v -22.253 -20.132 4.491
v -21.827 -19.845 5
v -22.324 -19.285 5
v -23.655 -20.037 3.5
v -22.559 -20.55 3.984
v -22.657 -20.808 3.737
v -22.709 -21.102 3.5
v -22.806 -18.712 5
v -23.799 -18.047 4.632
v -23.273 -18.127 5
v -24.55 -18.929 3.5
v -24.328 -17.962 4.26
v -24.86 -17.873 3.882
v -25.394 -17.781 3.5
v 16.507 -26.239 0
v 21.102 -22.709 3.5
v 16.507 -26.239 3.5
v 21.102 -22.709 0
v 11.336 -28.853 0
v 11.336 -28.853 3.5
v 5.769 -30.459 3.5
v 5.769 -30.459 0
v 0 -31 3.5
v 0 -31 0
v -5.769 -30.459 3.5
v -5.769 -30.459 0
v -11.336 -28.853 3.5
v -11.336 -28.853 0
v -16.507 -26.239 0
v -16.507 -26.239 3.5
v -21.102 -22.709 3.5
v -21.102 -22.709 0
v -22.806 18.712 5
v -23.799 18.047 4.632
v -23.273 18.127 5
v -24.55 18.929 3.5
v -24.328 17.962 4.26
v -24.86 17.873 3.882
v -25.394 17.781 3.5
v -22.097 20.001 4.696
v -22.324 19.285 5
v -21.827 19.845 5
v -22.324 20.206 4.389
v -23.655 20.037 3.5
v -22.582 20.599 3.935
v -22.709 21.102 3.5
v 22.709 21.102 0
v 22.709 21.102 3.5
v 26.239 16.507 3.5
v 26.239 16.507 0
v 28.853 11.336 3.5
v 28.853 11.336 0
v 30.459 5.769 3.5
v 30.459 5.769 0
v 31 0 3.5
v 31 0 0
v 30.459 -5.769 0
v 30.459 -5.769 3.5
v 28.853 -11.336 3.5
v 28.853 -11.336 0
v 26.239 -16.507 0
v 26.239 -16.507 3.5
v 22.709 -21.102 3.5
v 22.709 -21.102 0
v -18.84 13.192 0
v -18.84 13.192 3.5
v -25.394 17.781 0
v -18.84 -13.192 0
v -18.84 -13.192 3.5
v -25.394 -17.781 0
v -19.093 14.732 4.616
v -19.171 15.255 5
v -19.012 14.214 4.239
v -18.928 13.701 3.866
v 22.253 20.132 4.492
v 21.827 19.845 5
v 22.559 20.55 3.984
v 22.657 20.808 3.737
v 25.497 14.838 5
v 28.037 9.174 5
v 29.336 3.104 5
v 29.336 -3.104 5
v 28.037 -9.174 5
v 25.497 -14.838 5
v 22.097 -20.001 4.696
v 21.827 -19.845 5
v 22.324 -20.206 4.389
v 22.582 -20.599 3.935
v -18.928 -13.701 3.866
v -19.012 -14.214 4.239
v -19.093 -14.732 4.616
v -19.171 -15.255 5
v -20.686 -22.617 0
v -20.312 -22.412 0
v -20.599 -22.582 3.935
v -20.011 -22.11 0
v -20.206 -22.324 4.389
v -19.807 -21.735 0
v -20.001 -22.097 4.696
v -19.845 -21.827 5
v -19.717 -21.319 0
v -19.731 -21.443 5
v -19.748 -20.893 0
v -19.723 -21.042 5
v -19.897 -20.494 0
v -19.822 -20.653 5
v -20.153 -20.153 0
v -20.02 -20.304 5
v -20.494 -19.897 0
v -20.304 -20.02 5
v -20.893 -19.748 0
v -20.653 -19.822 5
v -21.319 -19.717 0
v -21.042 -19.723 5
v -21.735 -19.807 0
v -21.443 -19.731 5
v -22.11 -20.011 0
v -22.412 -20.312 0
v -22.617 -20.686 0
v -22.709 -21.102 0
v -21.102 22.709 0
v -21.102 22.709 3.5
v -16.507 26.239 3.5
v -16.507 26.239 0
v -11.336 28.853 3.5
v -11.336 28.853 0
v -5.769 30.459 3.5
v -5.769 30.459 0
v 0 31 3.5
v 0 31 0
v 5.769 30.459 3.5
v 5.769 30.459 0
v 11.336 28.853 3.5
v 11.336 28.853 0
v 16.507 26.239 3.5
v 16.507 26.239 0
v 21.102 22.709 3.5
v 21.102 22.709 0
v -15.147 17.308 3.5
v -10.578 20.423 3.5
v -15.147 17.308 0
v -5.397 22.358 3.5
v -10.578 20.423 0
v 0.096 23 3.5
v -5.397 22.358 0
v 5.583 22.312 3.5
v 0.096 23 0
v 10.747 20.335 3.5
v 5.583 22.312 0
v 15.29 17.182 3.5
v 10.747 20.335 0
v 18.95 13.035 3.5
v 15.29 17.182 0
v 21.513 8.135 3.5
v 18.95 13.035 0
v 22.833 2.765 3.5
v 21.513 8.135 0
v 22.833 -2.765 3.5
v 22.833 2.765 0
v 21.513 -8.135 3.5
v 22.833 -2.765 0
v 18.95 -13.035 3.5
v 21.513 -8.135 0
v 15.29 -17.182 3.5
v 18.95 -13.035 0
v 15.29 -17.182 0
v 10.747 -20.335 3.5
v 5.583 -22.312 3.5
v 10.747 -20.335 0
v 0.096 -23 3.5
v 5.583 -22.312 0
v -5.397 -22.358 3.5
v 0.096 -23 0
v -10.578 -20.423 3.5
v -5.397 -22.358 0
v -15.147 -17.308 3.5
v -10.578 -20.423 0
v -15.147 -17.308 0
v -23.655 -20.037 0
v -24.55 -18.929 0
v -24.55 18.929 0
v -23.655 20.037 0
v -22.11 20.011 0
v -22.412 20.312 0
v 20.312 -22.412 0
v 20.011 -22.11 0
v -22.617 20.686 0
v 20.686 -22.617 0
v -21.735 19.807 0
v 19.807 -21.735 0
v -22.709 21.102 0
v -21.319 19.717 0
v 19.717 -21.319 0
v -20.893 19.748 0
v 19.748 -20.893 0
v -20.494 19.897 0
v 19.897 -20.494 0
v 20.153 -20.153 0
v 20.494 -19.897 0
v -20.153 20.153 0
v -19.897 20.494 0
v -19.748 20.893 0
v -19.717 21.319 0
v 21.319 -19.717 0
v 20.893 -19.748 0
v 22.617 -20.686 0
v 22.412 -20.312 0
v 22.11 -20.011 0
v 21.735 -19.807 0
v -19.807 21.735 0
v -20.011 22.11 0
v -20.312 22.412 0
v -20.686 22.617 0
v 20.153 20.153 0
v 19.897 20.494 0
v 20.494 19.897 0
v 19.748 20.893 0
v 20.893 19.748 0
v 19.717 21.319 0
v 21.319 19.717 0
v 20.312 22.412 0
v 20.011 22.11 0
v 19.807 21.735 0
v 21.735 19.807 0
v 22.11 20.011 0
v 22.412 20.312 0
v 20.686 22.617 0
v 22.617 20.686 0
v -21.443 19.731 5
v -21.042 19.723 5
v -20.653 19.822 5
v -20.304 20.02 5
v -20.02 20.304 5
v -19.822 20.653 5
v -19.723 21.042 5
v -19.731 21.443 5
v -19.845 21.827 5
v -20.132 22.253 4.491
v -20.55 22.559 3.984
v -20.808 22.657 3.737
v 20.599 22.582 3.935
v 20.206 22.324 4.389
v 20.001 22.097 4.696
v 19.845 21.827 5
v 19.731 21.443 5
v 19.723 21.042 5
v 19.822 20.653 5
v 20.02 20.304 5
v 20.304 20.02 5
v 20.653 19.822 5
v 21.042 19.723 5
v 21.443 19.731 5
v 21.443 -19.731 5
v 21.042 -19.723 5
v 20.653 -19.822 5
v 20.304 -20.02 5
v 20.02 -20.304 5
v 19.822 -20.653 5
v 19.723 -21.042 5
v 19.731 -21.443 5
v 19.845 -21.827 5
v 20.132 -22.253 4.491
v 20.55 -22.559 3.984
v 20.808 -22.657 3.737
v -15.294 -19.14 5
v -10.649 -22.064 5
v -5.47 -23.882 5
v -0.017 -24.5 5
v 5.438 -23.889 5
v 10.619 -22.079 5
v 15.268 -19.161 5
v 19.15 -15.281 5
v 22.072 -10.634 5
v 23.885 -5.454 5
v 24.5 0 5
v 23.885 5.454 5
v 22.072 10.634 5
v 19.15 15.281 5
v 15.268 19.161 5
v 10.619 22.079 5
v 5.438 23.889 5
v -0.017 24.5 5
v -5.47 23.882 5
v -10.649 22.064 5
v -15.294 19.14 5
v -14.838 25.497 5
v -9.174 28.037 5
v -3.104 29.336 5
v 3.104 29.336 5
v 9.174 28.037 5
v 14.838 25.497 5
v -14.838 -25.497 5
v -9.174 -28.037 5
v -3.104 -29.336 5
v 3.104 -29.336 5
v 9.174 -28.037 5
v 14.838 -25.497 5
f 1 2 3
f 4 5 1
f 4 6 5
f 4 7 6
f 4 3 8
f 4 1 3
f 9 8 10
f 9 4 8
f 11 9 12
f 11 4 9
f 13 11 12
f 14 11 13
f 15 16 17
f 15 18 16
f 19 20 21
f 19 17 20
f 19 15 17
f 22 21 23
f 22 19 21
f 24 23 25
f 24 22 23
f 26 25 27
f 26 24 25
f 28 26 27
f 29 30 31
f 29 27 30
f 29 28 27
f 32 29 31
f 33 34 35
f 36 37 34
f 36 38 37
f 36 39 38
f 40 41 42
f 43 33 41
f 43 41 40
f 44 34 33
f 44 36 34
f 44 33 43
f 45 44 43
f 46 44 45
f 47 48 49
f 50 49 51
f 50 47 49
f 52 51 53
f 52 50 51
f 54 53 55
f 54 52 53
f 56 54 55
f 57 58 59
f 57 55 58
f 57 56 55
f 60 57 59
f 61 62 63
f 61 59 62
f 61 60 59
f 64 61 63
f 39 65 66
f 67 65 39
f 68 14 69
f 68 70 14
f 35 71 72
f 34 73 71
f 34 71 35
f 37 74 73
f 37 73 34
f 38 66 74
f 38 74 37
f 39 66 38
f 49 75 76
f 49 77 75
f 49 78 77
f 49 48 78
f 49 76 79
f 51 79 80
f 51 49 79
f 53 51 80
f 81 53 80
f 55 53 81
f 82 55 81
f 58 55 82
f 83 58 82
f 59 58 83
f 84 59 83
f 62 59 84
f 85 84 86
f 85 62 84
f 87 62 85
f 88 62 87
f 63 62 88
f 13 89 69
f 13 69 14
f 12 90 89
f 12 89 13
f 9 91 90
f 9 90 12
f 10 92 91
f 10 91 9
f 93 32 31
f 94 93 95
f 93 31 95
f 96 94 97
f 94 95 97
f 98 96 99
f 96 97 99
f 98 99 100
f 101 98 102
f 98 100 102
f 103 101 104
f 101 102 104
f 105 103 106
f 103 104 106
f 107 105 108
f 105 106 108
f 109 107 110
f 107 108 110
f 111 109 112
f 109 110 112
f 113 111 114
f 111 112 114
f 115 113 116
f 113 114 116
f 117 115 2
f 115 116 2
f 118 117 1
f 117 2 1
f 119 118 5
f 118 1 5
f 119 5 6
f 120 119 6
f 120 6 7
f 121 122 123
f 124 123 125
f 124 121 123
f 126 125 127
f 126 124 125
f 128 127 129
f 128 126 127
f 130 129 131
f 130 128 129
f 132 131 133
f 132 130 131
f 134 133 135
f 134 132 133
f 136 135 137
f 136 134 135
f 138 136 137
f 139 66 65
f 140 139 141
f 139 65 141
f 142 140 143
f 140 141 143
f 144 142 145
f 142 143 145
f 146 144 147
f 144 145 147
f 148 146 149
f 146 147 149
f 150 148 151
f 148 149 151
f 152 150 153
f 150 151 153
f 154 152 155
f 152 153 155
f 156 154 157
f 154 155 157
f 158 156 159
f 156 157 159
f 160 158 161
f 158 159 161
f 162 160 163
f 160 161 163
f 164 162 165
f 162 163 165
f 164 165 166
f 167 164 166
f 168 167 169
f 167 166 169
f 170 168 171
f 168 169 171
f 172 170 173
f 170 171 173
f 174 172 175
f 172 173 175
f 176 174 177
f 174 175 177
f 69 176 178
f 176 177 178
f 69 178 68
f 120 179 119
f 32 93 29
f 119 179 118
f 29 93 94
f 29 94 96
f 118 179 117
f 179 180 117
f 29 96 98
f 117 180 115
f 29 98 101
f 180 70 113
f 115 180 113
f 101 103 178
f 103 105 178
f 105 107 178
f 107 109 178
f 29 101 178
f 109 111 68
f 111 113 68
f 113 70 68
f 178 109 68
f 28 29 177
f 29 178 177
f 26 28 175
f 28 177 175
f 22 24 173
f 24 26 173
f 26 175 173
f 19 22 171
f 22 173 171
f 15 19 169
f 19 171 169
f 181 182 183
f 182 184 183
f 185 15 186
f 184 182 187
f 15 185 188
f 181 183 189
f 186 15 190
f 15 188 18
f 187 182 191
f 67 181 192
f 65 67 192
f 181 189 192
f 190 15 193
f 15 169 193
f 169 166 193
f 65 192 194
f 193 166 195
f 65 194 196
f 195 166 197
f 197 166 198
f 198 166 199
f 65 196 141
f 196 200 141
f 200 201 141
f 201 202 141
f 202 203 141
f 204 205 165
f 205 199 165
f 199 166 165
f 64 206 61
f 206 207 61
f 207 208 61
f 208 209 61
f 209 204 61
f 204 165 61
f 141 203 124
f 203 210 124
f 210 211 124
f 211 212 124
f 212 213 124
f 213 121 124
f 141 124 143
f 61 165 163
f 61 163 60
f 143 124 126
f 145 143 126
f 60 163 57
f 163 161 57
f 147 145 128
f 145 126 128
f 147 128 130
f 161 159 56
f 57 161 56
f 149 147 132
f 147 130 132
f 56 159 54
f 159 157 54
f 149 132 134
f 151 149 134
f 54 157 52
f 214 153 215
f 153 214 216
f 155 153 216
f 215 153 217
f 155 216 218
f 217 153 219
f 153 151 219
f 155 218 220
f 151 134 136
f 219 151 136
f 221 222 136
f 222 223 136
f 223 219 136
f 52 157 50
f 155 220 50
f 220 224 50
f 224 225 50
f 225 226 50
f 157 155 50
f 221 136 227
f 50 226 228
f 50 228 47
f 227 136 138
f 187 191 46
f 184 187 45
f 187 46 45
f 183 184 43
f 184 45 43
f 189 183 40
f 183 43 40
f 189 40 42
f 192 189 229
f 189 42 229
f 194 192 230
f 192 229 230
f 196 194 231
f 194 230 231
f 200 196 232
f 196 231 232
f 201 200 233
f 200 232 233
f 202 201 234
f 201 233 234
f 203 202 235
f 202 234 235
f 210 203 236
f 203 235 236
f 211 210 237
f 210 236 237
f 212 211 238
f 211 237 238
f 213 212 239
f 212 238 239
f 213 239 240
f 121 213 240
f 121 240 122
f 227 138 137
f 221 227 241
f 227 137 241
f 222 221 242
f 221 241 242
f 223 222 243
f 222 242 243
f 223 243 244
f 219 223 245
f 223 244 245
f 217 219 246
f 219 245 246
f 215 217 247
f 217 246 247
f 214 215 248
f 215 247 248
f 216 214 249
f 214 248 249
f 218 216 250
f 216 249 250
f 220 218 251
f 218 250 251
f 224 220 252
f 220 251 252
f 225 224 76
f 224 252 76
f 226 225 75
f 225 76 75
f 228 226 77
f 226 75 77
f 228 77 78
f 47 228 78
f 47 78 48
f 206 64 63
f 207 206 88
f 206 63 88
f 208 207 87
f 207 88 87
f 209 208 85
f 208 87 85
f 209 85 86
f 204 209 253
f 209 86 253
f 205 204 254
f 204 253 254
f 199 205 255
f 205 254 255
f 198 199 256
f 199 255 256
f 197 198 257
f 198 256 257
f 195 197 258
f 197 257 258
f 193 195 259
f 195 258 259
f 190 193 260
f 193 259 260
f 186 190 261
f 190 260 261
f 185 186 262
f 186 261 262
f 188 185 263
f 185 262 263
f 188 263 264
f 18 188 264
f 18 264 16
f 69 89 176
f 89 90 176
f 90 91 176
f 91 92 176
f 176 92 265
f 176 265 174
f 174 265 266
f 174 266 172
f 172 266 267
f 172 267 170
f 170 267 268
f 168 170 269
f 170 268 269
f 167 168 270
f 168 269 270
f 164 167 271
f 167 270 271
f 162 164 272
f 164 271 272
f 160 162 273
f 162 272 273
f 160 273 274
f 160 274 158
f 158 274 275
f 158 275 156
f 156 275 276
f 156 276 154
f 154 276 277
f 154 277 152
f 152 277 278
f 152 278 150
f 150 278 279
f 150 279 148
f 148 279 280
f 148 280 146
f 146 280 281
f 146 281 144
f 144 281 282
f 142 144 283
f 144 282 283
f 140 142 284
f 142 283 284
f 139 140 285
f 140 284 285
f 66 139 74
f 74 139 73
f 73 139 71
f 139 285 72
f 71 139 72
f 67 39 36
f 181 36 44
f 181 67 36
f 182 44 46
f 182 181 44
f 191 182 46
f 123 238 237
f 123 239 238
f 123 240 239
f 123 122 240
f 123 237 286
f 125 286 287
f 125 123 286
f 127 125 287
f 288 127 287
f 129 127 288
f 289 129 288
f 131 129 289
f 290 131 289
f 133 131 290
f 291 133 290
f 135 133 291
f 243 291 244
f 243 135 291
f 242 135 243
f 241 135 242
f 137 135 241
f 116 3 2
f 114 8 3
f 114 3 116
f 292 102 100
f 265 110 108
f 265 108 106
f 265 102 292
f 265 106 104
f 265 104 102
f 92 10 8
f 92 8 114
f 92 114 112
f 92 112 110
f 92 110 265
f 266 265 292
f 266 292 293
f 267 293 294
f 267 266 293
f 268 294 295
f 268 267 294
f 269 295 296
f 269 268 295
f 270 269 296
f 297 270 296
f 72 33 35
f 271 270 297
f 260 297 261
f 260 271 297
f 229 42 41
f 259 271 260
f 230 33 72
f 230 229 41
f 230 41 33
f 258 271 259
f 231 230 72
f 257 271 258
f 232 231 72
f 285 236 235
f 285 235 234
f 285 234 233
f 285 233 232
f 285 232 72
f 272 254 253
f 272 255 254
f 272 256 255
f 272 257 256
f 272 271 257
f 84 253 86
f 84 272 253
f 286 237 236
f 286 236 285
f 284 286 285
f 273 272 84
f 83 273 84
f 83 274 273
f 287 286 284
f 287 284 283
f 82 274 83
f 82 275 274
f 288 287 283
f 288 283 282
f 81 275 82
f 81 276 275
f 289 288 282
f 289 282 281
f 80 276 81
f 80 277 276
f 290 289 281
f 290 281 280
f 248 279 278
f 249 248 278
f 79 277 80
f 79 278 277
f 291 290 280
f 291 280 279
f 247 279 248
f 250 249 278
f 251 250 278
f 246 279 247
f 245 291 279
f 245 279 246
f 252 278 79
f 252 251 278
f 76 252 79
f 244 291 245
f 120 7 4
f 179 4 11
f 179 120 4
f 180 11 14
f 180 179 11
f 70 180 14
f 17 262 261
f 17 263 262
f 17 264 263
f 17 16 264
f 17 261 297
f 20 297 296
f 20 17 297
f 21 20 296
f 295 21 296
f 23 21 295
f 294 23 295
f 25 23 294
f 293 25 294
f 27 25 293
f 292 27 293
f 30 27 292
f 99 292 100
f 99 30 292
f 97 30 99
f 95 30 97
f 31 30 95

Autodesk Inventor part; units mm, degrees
ref_plane "YZ Plane" through (0, 0, 0) normal (1, 0, 0) x (0, 1, 0)
ref_plane "XZ Plane" through (0, 0, 0) normal (0, 1, 0) x (-1, 0, 0)
ref_plane "XY Plane" through (0, 0, 0) normal (0, 0, 1) x (1, 0, 0)
sketch "スケッチ1" plane through (0, 0, 0) normal (0, 0, 1) x (1, 0, 0)
  arc A0 (-18.8405, -13.1923) -> (-18.8405, 13.1923) centre (0, 0) ccw
  line L0 (-36.6725, 0) -> (42.2787, 0) projected
  arc A1 (-25.3937, -17.7809) -> (-25.3937, 17.7809) centre (0, 0) ccw
  line L1 (-25.3937, -17.7809) -> (-18.8405, -13.1923)
  line L2 (-18.8405, 13.1923) -> (-25.3937, 17.7809)
  point P0 (23, 0)
  dimension "d0" = 23
  dimension "d1" = 8
  dimension "d2" = 290
extrude "押し出し1" add sketch "スケッチ1" along normal blind 5
chamfer "面取り1" distance 1.5 angle 45 5 edges at (31, 0, 5) (6.9162, -21.9355, 5) (6.9162, 21.9355, 5) (-22.1171, 15.4866, 5) (-22.1171, -15.4866, 5)
sketch "スケッチ2" plane through (0, 0, 5) normal (0, 0, 1) x (1, 0, 0)
  circle A0 centre (-21.2132, 21.2132) radius 1.5 projected
  circle A1 centre (21.2132, 21.2132) radius 1.5 projected
  circle A2 centre (21.2132, -21.2132) radius 1.5 projected
  circle A3 centre (-21.2132, -21.2132) radius 1.5 projected
  point P0 (0, 0)
extrude "押し出し2" cut sketch "スケッチ2" against normal through all
properties part number "cover"
